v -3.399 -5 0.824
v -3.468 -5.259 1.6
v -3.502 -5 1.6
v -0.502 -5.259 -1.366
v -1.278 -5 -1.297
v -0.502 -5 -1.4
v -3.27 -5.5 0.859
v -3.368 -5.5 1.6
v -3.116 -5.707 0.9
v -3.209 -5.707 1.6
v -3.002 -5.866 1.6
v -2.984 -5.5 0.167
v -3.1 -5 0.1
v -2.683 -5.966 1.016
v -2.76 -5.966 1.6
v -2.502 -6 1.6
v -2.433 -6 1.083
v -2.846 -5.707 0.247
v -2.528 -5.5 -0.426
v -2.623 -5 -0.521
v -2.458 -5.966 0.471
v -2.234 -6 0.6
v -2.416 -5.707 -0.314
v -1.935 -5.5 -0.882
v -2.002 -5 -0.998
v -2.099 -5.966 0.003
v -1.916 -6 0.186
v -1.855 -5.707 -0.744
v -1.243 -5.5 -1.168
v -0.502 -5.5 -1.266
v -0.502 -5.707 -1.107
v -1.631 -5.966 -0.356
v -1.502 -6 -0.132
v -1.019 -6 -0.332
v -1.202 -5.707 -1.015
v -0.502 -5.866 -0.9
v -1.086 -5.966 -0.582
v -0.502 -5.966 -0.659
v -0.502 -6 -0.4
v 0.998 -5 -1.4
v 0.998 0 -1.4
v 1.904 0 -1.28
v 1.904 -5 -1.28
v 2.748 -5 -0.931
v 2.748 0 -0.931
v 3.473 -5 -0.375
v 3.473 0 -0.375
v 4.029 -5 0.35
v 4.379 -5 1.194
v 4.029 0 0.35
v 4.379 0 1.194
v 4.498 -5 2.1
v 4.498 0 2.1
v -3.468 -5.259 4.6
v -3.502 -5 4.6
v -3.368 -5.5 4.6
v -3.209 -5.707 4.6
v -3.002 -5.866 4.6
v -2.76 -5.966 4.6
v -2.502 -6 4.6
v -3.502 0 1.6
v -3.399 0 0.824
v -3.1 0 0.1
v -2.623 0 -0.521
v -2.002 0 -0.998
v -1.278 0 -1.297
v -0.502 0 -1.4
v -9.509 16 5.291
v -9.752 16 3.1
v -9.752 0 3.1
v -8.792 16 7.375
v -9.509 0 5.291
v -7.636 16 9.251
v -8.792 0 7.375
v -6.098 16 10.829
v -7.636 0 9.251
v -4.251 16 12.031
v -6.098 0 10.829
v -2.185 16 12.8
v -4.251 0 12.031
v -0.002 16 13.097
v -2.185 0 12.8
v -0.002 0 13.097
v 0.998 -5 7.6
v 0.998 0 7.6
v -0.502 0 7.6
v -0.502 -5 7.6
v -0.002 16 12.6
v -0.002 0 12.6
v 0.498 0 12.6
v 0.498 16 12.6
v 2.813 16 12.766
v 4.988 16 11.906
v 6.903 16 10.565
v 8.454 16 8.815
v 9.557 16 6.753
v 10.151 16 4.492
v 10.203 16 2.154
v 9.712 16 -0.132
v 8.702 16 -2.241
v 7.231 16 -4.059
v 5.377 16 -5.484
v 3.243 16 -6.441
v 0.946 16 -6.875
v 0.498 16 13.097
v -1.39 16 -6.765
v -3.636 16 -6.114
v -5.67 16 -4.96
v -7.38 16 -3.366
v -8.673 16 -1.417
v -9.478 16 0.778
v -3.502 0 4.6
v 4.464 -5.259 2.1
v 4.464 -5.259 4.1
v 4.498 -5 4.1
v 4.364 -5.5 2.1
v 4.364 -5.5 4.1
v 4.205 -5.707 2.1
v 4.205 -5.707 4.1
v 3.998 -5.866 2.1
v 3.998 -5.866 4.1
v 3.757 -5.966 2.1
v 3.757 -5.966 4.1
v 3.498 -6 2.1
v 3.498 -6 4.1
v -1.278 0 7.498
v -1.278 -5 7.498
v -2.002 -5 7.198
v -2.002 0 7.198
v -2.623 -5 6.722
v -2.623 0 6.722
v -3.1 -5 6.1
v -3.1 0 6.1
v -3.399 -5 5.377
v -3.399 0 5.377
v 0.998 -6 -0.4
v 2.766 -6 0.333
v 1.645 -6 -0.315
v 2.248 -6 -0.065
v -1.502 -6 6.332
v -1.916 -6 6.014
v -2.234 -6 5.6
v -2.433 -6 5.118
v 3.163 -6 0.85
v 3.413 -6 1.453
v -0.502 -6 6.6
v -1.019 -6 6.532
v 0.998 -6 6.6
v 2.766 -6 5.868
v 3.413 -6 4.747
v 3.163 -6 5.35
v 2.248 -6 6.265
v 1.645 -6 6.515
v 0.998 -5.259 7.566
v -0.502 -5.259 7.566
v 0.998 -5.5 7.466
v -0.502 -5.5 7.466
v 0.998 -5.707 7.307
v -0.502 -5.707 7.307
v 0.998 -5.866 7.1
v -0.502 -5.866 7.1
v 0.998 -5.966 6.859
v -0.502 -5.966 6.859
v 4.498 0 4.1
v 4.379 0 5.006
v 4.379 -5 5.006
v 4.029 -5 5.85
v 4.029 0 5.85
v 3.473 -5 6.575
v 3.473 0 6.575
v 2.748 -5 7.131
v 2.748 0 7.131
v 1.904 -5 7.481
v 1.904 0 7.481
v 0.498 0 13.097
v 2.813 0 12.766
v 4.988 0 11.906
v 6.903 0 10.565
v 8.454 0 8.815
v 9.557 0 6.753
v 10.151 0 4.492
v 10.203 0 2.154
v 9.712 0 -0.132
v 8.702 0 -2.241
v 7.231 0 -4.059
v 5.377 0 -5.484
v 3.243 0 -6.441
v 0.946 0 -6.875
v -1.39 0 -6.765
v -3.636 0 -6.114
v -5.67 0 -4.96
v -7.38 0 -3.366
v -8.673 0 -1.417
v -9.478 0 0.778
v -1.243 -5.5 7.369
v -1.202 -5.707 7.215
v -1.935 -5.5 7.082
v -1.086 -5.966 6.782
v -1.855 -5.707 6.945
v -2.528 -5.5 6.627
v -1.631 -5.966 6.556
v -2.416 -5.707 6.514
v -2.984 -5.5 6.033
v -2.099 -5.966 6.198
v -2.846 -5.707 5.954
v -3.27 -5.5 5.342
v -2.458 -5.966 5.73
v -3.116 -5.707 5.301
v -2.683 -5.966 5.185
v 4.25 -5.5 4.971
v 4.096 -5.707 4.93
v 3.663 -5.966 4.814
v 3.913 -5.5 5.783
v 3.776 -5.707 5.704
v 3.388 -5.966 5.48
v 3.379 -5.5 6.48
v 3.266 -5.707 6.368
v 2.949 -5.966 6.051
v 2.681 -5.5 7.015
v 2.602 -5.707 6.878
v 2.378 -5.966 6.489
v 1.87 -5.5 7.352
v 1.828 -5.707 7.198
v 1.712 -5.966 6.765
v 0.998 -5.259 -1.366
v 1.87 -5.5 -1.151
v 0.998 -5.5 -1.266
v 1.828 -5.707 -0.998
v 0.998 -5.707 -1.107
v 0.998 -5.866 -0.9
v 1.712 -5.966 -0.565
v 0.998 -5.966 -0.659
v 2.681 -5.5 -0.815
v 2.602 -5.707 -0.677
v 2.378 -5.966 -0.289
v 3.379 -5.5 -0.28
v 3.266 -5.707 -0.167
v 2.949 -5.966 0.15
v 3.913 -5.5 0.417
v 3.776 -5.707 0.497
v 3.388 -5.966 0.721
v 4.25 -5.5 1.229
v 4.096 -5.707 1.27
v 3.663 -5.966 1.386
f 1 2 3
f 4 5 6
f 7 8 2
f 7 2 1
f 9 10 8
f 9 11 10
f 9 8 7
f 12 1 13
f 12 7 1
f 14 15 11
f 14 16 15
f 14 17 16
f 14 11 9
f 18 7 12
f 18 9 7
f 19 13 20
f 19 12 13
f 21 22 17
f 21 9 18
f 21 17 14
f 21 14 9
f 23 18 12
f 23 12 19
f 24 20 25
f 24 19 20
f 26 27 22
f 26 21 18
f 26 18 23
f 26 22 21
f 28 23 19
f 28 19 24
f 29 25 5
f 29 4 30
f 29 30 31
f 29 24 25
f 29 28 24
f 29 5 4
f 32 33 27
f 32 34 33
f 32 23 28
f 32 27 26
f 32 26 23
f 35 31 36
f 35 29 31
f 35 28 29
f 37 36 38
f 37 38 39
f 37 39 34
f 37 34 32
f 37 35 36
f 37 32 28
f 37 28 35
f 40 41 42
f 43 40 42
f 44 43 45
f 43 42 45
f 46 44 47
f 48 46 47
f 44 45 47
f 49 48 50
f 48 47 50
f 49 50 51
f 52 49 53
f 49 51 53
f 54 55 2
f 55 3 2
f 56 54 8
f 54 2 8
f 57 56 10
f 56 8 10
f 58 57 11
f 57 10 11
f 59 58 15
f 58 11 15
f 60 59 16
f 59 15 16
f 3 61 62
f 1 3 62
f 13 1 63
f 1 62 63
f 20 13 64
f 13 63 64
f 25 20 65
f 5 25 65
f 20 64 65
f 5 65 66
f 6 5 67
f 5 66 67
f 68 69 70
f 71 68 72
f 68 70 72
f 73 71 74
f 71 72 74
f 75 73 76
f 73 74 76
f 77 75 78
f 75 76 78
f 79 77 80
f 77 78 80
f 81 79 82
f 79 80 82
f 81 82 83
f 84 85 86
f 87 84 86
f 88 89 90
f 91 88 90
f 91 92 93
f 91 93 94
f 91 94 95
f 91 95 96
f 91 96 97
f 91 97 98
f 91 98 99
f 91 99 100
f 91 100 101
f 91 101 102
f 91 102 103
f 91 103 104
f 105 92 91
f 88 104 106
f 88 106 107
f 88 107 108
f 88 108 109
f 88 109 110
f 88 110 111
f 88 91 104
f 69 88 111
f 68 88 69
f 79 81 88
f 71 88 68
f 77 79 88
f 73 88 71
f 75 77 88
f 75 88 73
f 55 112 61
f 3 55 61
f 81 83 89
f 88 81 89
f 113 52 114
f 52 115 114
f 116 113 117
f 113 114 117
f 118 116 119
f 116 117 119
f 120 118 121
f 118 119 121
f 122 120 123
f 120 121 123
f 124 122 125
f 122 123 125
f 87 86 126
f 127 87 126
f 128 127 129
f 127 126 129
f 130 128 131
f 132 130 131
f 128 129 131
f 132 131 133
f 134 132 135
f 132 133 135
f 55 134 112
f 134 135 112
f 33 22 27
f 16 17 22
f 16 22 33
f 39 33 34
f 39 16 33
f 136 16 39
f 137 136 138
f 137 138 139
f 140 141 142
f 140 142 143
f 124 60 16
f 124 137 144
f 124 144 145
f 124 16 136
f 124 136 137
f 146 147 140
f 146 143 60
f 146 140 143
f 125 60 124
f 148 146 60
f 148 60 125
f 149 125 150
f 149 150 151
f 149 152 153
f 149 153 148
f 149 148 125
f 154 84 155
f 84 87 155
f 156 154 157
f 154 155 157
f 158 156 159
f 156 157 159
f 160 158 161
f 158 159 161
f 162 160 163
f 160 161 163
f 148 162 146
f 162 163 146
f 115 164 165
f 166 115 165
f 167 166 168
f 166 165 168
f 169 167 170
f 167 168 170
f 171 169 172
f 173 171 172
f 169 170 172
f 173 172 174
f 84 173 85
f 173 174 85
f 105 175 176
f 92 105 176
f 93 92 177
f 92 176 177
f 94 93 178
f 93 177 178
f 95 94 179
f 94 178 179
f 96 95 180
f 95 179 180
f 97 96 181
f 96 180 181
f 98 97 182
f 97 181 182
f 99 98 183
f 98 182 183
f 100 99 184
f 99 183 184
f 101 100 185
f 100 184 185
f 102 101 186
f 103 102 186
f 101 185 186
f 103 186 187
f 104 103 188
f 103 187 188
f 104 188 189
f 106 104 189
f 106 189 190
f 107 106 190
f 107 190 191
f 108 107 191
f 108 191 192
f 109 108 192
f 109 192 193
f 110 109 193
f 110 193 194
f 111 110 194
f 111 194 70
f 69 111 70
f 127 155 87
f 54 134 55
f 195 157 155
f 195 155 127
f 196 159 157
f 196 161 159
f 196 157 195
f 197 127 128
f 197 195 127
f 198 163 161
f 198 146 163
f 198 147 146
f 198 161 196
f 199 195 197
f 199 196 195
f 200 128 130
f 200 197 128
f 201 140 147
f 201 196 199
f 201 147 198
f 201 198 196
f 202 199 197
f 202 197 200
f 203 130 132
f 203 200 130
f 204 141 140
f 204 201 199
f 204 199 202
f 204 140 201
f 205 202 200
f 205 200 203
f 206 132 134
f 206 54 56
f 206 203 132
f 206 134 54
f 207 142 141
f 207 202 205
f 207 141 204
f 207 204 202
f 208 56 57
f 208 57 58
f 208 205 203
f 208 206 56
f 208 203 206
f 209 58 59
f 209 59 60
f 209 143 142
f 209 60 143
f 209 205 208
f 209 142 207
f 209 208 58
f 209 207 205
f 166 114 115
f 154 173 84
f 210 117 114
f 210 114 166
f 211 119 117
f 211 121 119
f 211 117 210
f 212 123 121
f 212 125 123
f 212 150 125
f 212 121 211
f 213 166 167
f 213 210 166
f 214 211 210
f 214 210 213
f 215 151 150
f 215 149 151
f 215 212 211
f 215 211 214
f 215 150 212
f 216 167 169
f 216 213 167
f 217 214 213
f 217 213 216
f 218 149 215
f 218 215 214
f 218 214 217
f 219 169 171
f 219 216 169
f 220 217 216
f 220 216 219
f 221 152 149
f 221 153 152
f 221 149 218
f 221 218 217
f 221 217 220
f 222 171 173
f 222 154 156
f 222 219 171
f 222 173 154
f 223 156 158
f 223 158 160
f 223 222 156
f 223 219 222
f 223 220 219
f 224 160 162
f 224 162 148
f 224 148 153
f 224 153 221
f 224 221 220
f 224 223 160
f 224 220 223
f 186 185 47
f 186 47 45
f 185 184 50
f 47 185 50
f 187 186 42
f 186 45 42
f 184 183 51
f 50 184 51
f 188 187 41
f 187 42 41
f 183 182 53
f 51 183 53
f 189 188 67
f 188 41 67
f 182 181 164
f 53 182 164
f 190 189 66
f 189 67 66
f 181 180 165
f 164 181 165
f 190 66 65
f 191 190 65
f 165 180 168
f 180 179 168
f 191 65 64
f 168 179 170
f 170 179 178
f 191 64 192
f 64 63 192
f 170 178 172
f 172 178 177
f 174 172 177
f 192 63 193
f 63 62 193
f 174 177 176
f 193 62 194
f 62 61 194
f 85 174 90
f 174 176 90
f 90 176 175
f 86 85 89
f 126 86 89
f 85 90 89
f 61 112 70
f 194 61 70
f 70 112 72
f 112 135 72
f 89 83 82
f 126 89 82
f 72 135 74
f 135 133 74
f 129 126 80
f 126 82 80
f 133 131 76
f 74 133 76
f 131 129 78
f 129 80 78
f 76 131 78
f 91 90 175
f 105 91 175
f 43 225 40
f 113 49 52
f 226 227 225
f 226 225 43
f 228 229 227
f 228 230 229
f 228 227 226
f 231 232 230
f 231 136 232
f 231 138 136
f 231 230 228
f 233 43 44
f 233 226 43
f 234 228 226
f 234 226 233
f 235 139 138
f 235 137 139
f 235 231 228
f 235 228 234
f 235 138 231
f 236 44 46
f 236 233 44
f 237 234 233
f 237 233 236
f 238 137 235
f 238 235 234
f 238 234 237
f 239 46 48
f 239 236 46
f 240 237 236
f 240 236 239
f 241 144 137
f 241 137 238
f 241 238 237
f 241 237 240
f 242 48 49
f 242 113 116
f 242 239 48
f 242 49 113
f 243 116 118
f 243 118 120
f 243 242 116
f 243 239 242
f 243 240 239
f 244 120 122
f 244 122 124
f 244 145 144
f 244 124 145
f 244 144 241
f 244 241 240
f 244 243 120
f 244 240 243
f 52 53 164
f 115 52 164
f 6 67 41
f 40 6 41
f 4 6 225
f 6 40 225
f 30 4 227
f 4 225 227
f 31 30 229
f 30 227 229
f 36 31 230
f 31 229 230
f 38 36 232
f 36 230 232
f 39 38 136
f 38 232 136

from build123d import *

# Parameters (mm, degrees)
F1_DEPTH = 6
F2_R     = 1
F3_R     = 10
F4_DEPTH = 16
F6_DEPTH = 25


with BuildPart() as f1:
    # F0 (on Front) → F1 (new body)
    with BuildSketch(Plane.XZ):
        with BuildLine():
            Line((0.9983844832, 7.6002832444), (-0.5016155168, 7.6002832444))
            ThreePointArc((-0.5016155168, 7.6002832444), (-2.6229358604, 6.7216035879), (-3.5016155168, 4.6002832444))
            Line((-3.5016155168, 4.6002832444), (-3.5016155168, 1.6002832444))
            ThreePointArc((-3.5016155168, 1.6002832444), (-2.6229358604, -0.5210370992), (-0.5016155168, -1.3997167556))
            Line((-0.5016155168, -1.3997167556), (0.9983844832, -1.3997167556))
            ThreePointArc((0.9983844832, -1.3997167556), (3.4732582173, -0.3745904898), (4.4983844832, 2.1002832444))
            Line((4.4983844832, 2.1002832444), (4.4983844832, 4.1002832444))
            ThreePointArc((4.4983844832, 4.1002832444), (3.4732582173, 6.5751569785), (0.9983844832, 7.6002832444))
        make_face()
    extrude(amount=F1_DEPTH)

    # F2
    f2_edges = [f1.edges().sort_by_distance(p)[0] for p in [
        (3.473258, -6, 6.575157),
        (0.248384, -6, 7.600283),
        (-2.622936, -6, 6.721604),
        (-3.501616, -6, 3.100283),
        (-2.622936, -6, -0.521037),
        (0.248384, -6, -1.399717),
        (3.473258, -6, -0.37459),
        (4.498384, -6, 3.100283),
    ]]
    fillet(f2_edges, radius=F2_R)

    # F3 (on face) → F4 (join)
    with BuildSketch(Plane(origin=(0, 0, 0), x_dir=(-1, 0, 0), z_dir=(0, 1, 0))):
        with Locations((-0.2483844832, 3.1002832444)):
            Circle(F3_R)
        with BuildLine():
            Line((3.5016155168, 4.6002832444), (3.5016155168, 3.1002832444))
            Line((3.5016155168, 3.1002832444), (3.5016155168, 1.6002832444))
            ThreePointArc((3.5016155168, 1.6002832444), (2.6229358604, -0.5210370992), (0.5016155168, -1.3997167556))
            Line((0.5016155168, -1.3997167556), (-0.2483844832, -1.3997167556))
            Line((-0.2483844832, -1.3997167556), (-0.9983844832, -1.3997167556))
            ThreePointArc((-0.9983844832, -1.3997167556), (-3.4732582173, -0.3745904898), (-4.4983844832, 2.1002832444))
            Line((-4.4983844832, 2.1002832444), (-4.4983844832, 3.1002832444))
            Line((-4.4983844832, 3.1002832444), (-4.4983844832, 4.1002832444))
            ThreePointArc((-4.4983844832, 4.1002832444), (-3.4732582173, 6.5751569785), (-0.9983844832, 7.6002832444))
            Line((-0.9983844832, 7.6002832444), (-0.2483844832, 7.6002832444))
            Line((-0.2483844832, 7.6002832444), (0.5016155168, 7.6002832444))
            ThreePointArc((0.5016155168, 7.6002832444), (2.6229358604, 6.7216035879), (3.5016155168, 4.6002832444))
        make_face(mode=Mode.SUBTRACT)
        with BuildLine():
            Line((-0.2483844832, -1.3997167556), (-0.2483844832, 3.1002832444))
            Line((-0.2483844832, 3.1002832444), (-4.4983844832, 3.1002832444))
            Line((-4.4983844832, 3.1002832444), (-4.4983844832, 2.1002832444))
            ThreePointArc((-4.4983844832, 2.1002832444), (-3.4732582173, -0.3745904898), (-0.9983844832, -1.3997167556))
            Line((-0.9983844832, -1.3997167556), (-0.2483844832, -1.3997167556))
        make_face()
        with BuildLine():
            Line((-4.4983844832, 3.1002832444), (-0.2483844832, 3.1002832444))
            Line((-0.2483844832, 3.1002832444), (-0.2483844832, 7.6002832444))
            Line((-0.2483844832, 7.6002832444), (-0.9983844832, 7.6002832444))
            ThreePointArc((-0.9983844832, 7.6002832444), (-3.4732582173, 6.5751569785), (-4.4983844832, 4.1002832444))
            Line((-4.4983844832, 4.1002832444), (-4.4983844832, 3.1002832444))
        make_face()
        with BuildLine():
            Line((3.5016155168, 1.6002832444), (3.5016155168, 3.1002832444))
            Line((3.5016155168, 3.1002832444), (-0.2483844832, 3.1002832444))
            Line((-0.2483844832, 3.1002832444), (-0.2483844832, -1.3997167556))
            Line((-0.2483844832, -1.3997167556), (0.5016155168, -1.3997167556))
            ThreePointArc((0.5016155168, -1.3997167556), (2.6229358604, -0.5210370992), (3.5016155168, 1.6002832444))
        make_face()
        with BuildLine():
            Line((-0.2483844832, 3.1002832444), (3.5016155168, 3.1002832444))
            Line((3.5016155168, 3.1002832444), (3.5016155168, 4.6002832444))
            ThreePointArc((3.5016155168, 4.6002832444), (2.6229358604, 6.7216035879), (0.5016155168, 7.6002832444))
            Line((0.5016155168, 7.6002832444), (-0.2483844832, 7.6002832444))
            Line((-0.2483844832, 7.6002832444), (-0.2483844832, 3.1002832444))
        make_face()
    extrude(amount=F4_DEPTH)

    # F5 (on face) → F6 (cut)
    with BuildSketch(Plane.XZ):
        with BuildLine():
            Line((-0.0016155168, 12.6002832444), (0.2483844832, 12.6002832444))
            Line((0.2483844832, 12.6002832444), (0.2483844832, 13.1002832444))
            ThreePointArc((0.2483844832, 13.1002832444), (0.1233747149, 13.0995018417), (-0.0016155168, 13.0971577559))
            Line((-0.0016155168, 13.0971577559), (-0.0016155168, 12.6002832444))
        make_face()
        with BuildLine():
            Line((0.2483844832, 13.1002832444), (0.2483844832, 12.6002832444))
            Line((0.2483844832, 12.6002832444), (0.4983844832, 12.6002832444))
            Line((0.4983844832, 12.6002832444), (0.4983844832, 13.0971577559))
            ThreePointArc((0.4983844832, 13.0971577559), (0.3733942515, 13.0995018417), (0.2483844832, 13.1002832444))
        make_face()
    extrude(amount=-F6_DEPTH, mode=Mode.SUBTRACT)


solid = f1.part
